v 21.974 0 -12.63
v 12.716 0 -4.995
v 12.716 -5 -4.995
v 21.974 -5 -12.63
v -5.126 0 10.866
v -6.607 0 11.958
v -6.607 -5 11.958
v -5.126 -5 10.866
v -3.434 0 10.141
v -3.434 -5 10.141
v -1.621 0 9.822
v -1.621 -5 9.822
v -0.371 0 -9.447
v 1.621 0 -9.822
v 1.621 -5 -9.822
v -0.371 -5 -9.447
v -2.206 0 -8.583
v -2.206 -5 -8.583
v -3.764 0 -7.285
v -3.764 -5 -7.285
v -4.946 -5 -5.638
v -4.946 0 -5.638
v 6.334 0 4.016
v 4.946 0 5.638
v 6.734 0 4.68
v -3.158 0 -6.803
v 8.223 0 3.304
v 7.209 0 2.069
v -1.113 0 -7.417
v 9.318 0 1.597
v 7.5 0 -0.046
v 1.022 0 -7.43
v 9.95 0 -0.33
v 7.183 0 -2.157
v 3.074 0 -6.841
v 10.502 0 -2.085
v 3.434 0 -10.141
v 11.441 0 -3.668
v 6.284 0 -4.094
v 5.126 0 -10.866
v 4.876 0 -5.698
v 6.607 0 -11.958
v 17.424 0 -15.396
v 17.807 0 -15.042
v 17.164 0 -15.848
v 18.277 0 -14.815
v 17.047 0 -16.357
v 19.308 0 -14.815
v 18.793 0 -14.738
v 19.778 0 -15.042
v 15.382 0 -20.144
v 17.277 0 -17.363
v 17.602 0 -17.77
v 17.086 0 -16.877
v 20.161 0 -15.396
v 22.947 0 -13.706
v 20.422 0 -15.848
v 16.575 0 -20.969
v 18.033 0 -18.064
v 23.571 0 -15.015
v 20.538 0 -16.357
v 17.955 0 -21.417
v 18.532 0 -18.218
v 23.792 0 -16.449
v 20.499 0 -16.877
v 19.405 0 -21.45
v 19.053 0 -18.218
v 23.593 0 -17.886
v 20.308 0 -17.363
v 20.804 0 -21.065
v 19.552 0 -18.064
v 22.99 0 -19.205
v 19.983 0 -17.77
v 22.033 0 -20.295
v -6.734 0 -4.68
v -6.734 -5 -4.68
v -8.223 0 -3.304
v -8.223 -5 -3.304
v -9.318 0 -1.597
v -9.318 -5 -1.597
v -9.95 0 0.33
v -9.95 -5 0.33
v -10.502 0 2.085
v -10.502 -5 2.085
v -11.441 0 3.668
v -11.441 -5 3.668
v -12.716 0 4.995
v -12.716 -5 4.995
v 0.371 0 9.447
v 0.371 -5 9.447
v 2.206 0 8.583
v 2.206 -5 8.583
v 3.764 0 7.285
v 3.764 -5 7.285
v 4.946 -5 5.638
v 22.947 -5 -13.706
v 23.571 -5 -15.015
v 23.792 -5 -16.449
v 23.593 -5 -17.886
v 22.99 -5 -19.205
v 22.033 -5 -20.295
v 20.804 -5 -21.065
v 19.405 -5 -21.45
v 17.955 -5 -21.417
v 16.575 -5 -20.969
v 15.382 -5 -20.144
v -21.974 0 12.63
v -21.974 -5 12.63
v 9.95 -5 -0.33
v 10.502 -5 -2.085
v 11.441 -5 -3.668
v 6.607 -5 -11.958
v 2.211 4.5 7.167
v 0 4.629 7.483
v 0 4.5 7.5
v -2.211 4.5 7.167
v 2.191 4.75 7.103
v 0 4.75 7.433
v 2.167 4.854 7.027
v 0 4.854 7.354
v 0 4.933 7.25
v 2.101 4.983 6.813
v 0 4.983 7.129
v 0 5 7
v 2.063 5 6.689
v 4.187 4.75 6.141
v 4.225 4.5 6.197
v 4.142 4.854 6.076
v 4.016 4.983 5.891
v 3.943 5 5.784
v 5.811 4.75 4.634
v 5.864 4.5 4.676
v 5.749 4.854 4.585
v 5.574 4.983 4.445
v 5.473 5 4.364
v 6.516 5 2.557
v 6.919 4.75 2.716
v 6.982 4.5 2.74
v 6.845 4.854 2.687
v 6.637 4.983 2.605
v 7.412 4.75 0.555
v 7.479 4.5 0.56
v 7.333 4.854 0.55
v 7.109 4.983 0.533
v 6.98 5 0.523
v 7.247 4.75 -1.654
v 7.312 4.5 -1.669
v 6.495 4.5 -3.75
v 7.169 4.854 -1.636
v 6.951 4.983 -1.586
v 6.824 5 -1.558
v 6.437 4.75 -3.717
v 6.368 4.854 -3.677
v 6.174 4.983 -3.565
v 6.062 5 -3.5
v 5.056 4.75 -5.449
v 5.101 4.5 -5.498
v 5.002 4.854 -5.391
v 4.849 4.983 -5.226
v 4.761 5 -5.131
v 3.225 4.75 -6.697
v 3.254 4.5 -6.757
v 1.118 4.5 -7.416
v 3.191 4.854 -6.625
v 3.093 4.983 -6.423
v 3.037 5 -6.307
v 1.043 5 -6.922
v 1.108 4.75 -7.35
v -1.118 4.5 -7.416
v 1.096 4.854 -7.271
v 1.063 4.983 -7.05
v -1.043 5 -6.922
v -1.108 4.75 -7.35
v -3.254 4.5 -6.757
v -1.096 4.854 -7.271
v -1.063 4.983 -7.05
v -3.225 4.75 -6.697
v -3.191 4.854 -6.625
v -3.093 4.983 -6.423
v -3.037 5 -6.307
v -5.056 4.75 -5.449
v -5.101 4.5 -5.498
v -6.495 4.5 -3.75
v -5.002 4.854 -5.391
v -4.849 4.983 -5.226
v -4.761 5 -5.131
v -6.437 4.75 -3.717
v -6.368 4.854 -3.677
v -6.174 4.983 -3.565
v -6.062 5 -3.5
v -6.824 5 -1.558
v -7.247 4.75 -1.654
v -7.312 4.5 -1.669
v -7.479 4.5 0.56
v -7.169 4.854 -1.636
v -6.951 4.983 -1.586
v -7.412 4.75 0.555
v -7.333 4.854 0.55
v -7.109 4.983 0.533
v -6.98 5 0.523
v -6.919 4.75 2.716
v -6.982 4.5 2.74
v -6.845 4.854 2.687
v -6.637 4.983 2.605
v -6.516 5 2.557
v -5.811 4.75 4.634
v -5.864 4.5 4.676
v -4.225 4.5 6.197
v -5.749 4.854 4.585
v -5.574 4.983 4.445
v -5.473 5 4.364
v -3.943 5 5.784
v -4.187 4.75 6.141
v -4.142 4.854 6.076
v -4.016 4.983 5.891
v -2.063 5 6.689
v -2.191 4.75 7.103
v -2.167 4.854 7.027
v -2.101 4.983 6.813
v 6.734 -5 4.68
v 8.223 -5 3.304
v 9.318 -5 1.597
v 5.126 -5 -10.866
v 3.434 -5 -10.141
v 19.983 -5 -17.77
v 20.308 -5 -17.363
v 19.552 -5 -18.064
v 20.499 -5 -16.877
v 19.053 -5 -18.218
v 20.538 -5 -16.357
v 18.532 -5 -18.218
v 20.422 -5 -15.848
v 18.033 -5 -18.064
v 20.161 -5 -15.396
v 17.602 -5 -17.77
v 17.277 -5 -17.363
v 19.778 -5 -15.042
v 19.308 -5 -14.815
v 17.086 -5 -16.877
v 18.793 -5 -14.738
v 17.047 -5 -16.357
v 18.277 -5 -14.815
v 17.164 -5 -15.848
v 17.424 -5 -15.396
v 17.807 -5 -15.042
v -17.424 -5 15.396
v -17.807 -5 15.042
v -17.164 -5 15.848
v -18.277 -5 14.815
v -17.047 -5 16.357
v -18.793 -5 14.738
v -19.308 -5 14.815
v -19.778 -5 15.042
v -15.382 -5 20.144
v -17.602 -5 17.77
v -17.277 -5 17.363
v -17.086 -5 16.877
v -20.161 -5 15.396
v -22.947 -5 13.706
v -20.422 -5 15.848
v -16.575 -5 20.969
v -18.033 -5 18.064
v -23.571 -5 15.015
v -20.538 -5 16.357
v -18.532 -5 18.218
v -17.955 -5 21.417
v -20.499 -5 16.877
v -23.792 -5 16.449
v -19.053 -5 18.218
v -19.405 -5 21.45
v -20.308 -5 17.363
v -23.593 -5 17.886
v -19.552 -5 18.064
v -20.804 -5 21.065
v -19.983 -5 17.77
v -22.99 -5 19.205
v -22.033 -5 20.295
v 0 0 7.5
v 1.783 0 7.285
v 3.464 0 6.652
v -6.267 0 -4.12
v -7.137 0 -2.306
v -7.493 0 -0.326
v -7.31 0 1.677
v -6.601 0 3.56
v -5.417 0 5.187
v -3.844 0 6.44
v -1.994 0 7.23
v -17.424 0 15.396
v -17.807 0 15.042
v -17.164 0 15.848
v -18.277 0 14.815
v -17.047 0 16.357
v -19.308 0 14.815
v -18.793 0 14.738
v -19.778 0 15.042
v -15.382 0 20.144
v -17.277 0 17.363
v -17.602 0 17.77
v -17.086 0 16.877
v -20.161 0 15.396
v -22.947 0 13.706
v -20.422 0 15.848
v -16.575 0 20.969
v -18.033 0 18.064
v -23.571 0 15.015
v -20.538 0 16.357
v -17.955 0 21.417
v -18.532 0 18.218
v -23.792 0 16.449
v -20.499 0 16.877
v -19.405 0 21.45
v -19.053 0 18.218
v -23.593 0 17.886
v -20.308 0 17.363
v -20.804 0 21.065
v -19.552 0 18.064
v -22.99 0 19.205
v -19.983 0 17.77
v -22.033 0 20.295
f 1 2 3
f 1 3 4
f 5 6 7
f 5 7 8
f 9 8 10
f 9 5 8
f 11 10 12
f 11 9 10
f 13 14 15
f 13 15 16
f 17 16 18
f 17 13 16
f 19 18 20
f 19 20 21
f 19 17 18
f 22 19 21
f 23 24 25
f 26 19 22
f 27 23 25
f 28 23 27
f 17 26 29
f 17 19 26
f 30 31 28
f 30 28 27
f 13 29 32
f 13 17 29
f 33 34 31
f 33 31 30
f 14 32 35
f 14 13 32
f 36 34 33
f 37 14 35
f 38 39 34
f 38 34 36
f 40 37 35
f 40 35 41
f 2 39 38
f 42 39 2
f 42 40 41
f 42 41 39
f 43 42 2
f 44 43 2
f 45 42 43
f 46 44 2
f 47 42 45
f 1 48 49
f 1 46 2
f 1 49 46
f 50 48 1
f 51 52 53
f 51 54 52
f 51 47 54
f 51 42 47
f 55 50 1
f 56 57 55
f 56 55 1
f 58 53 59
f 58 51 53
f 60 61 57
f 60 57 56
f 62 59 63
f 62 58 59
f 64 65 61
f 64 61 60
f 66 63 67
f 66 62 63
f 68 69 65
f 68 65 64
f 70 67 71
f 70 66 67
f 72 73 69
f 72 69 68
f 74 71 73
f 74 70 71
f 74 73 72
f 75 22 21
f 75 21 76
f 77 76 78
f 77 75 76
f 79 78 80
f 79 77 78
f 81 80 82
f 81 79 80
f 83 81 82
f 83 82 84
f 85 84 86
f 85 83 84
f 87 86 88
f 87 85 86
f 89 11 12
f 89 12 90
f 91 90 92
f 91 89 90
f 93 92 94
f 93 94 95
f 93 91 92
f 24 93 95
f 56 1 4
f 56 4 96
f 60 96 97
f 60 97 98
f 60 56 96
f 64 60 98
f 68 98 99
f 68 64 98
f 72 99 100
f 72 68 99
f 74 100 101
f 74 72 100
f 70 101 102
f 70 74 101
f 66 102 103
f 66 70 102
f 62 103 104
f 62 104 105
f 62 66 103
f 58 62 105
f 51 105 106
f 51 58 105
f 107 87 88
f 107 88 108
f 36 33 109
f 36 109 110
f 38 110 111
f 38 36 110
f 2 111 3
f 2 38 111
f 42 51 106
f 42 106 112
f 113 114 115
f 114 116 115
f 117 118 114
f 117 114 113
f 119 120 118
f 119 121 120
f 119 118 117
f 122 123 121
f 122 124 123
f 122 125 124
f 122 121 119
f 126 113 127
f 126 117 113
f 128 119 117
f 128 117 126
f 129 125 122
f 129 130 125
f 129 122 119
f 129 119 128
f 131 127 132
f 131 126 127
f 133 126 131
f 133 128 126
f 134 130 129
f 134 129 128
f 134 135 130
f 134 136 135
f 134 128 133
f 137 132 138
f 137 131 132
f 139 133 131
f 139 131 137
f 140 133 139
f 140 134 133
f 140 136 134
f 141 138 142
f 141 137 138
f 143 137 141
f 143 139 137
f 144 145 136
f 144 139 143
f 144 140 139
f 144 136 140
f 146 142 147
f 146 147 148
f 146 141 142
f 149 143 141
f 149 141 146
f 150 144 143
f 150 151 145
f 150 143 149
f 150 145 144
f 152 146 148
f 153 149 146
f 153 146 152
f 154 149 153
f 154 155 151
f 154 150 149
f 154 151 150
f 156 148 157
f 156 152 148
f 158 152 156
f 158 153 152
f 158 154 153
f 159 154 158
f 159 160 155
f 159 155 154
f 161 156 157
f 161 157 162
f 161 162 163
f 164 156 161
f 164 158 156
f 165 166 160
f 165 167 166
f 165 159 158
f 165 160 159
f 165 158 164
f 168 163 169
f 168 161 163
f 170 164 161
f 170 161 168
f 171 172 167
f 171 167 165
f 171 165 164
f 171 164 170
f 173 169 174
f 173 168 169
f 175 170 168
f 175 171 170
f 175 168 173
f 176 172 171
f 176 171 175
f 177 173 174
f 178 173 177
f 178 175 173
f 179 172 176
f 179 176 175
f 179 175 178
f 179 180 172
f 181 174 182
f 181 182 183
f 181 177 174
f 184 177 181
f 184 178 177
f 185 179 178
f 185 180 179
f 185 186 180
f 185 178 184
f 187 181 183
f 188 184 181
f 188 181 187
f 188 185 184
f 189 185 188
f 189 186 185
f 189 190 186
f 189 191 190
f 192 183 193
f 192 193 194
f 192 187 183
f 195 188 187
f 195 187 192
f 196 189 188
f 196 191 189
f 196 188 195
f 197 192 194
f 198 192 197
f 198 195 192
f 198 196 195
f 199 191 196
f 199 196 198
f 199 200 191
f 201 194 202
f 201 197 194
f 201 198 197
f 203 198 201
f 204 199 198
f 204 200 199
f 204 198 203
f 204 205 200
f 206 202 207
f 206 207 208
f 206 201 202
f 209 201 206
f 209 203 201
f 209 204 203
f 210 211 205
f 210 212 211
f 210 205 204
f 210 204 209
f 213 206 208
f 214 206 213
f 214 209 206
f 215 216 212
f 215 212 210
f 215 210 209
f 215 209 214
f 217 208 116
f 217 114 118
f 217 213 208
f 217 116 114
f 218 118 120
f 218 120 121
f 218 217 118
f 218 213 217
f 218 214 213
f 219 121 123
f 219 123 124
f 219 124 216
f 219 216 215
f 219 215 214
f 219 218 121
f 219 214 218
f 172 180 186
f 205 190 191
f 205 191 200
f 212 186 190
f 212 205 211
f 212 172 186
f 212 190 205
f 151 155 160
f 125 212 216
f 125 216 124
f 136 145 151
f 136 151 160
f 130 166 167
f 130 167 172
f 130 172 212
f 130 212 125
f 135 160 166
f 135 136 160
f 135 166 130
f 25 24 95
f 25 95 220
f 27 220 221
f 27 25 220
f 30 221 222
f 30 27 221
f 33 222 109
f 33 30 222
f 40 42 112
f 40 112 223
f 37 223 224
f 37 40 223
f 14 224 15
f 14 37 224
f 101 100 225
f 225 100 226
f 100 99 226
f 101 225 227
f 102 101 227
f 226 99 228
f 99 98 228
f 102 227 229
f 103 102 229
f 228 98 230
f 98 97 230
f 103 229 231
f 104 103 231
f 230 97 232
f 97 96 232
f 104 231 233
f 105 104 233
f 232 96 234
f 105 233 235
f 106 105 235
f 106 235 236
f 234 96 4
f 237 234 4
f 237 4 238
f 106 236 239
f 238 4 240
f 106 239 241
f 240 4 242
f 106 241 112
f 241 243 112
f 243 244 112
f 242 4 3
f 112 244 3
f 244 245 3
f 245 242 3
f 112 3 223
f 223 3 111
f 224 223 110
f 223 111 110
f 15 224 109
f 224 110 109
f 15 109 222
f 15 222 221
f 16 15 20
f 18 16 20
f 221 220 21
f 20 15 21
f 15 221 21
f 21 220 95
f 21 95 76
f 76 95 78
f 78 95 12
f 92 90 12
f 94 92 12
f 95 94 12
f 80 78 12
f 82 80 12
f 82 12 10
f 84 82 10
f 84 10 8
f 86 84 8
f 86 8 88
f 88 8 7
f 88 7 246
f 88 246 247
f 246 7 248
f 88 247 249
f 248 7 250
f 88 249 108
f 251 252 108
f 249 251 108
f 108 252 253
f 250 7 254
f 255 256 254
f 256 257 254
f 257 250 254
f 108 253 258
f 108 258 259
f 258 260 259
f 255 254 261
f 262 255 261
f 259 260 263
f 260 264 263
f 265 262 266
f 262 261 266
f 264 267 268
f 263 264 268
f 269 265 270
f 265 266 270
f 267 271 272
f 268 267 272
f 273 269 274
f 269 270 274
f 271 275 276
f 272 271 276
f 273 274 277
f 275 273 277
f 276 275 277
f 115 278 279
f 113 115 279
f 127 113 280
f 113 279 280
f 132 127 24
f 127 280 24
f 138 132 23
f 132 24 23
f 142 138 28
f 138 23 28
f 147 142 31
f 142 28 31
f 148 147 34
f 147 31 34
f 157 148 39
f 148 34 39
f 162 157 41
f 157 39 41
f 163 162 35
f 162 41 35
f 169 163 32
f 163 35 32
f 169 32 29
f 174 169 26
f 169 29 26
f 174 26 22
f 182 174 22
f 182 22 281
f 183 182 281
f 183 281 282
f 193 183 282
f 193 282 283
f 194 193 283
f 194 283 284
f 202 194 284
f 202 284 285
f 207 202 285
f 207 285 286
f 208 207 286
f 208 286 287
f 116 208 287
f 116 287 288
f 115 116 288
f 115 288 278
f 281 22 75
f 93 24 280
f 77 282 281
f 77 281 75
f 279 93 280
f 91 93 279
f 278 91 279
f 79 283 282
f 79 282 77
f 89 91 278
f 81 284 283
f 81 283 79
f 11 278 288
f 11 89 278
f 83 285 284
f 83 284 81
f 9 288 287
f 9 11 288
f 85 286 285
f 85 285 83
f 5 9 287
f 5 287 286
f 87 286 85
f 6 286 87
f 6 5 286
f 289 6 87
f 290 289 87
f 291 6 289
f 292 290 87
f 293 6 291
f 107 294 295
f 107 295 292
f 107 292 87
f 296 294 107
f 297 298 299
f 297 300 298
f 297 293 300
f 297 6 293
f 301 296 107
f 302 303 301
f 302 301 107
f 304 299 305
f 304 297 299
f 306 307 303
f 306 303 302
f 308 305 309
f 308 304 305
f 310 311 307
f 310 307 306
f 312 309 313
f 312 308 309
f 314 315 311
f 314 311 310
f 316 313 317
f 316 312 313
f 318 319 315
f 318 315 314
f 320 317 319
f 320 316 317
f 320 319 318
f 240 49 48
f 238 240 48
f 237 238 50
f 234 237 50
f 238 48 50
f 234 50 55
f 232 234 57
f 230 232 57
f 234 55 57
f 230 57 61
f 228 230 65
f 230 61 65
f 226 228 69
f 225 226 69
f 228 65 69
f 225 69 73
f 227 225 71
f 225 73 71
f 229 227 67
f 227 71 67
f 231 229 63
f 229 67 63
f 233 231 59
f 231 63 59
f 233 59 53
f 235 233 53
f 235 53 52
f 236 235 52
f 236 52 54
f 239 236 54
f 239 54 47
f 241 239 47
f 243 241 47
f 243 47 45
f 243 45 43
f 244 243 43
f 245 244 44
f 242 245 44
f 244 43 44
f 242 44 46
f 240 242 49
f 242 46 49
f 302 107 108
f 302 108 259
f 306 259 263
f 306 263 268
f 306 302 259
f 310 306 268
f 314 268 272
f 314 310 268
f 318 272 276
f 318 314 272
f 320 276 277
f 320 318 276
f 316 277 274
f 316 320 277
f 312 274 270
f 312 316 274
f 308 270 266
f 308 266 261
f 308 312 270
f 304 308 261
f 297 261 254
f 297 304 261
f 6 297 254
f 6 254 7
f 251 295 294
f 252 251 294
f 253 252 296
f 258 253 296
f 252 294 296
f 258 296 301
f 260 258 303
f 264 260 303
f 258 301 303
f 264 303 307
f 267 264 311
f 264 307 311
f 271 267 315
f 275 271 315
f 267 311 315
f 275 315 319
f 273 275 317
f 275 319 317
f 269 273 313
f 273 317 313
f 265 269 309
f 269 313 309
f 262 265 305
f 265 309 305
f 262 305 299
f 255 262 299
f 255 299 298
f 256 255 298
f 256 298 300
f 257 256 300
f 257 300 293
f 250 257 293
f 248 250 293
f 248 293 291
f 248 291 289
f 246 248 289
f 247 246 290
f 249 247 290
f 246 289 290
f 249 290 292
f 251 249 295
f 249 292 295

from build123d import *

# Parameters (mm, degrees)
SKETCH1_R           = 7.5
BOSS_EXTRUDE1_DEPTH = 5
SKETCH2_R           = 1.75
BOSS_EXTRUDE2_DEPTH = 5
CIRPATTERN3_COUNT   = 2
FILLET5_R           = 0.5


with BuildPart() as part:
    # Sketch1 → Boss-Extrude1 (new body)
    with BuildSketch(Plane(origin=(0, 0, 0), x_dir=(1, 0, 0), z_dir=(0, 1, 0))):
        with Locations(Location((0, 0, 0), (0, 0, 270))):
            Circle(SKETCH1_R)
    extrude(amount=BOSS_EXTRUDE1_DEPTH)

    # Sketch2 → Boss-Extrude2 (add)
    with BuildSketch(Plane(origin=(0, 0, 0), x_dir=(1, 0, 0), z_dir=(0, 1, 0))):
        with BuildLine():
            Line((12.716294884, 4.995006753), (21.973895335, 12.630243088))
            ThreePointArc((21.973895335, 12.630243088), (22.551056235, 19.785091931), (15.381932825, 20.143764773))
            Line((15.381932825, 20.143764773), (6.607081232, 11.958291083))
            ThreePointArc((6.607081232, 11.958291083), (4.300797699, 10.454751027), (1.621374113, 9.822085487))
            ThreePointArc((1.621374113, 9.822085487), (-2.205943818, 8.582985268), (-4.946272983, 5.637764059))
            Line((-4.946272983, 5.637764059), (0, 0))
            Line((0, 0), (4.946272983, -5.637764059))
            ThreePointArc((4.946272983, -5.637764059), (8.223006092, -3.303936295), (9.949550947, 0.329625974))
            ThreePointArc((9.949550947, 0.329625974), (10.925462035, 2.903955787), (12.716294884, 4.995006753))
        make_face()
        with Locations(Location((18.792546862, 16.487576609, 0), (0, 0, 270))):
            Circle(SKETCH2_R, mode=Mode.SUBTRACT)
    boss_extrude2 = extrude(amount=-BOSS_EXTRUDE2_DEPTH)

    # CirPattern3: Boss-Extrude2 ×2 about axis
    cirpattern3_axis = Axis((0, 0, 0), (0, 1, 0))
    for i in range(1, CIRPATTERN3_COUNT):
        add(boss_extrude2.rotate(cirpattern3_axis, i * 360 / CIRPATTERN3_COUNT))

    # Fillet5
    fillet5_edges = [part.edges().sort_by_distance(p)[0] for p in [
        (0, 5, -7.5),
    ]]
    fillet(fillet5_edges, radius=FILLET5_R)


solid = part.part
